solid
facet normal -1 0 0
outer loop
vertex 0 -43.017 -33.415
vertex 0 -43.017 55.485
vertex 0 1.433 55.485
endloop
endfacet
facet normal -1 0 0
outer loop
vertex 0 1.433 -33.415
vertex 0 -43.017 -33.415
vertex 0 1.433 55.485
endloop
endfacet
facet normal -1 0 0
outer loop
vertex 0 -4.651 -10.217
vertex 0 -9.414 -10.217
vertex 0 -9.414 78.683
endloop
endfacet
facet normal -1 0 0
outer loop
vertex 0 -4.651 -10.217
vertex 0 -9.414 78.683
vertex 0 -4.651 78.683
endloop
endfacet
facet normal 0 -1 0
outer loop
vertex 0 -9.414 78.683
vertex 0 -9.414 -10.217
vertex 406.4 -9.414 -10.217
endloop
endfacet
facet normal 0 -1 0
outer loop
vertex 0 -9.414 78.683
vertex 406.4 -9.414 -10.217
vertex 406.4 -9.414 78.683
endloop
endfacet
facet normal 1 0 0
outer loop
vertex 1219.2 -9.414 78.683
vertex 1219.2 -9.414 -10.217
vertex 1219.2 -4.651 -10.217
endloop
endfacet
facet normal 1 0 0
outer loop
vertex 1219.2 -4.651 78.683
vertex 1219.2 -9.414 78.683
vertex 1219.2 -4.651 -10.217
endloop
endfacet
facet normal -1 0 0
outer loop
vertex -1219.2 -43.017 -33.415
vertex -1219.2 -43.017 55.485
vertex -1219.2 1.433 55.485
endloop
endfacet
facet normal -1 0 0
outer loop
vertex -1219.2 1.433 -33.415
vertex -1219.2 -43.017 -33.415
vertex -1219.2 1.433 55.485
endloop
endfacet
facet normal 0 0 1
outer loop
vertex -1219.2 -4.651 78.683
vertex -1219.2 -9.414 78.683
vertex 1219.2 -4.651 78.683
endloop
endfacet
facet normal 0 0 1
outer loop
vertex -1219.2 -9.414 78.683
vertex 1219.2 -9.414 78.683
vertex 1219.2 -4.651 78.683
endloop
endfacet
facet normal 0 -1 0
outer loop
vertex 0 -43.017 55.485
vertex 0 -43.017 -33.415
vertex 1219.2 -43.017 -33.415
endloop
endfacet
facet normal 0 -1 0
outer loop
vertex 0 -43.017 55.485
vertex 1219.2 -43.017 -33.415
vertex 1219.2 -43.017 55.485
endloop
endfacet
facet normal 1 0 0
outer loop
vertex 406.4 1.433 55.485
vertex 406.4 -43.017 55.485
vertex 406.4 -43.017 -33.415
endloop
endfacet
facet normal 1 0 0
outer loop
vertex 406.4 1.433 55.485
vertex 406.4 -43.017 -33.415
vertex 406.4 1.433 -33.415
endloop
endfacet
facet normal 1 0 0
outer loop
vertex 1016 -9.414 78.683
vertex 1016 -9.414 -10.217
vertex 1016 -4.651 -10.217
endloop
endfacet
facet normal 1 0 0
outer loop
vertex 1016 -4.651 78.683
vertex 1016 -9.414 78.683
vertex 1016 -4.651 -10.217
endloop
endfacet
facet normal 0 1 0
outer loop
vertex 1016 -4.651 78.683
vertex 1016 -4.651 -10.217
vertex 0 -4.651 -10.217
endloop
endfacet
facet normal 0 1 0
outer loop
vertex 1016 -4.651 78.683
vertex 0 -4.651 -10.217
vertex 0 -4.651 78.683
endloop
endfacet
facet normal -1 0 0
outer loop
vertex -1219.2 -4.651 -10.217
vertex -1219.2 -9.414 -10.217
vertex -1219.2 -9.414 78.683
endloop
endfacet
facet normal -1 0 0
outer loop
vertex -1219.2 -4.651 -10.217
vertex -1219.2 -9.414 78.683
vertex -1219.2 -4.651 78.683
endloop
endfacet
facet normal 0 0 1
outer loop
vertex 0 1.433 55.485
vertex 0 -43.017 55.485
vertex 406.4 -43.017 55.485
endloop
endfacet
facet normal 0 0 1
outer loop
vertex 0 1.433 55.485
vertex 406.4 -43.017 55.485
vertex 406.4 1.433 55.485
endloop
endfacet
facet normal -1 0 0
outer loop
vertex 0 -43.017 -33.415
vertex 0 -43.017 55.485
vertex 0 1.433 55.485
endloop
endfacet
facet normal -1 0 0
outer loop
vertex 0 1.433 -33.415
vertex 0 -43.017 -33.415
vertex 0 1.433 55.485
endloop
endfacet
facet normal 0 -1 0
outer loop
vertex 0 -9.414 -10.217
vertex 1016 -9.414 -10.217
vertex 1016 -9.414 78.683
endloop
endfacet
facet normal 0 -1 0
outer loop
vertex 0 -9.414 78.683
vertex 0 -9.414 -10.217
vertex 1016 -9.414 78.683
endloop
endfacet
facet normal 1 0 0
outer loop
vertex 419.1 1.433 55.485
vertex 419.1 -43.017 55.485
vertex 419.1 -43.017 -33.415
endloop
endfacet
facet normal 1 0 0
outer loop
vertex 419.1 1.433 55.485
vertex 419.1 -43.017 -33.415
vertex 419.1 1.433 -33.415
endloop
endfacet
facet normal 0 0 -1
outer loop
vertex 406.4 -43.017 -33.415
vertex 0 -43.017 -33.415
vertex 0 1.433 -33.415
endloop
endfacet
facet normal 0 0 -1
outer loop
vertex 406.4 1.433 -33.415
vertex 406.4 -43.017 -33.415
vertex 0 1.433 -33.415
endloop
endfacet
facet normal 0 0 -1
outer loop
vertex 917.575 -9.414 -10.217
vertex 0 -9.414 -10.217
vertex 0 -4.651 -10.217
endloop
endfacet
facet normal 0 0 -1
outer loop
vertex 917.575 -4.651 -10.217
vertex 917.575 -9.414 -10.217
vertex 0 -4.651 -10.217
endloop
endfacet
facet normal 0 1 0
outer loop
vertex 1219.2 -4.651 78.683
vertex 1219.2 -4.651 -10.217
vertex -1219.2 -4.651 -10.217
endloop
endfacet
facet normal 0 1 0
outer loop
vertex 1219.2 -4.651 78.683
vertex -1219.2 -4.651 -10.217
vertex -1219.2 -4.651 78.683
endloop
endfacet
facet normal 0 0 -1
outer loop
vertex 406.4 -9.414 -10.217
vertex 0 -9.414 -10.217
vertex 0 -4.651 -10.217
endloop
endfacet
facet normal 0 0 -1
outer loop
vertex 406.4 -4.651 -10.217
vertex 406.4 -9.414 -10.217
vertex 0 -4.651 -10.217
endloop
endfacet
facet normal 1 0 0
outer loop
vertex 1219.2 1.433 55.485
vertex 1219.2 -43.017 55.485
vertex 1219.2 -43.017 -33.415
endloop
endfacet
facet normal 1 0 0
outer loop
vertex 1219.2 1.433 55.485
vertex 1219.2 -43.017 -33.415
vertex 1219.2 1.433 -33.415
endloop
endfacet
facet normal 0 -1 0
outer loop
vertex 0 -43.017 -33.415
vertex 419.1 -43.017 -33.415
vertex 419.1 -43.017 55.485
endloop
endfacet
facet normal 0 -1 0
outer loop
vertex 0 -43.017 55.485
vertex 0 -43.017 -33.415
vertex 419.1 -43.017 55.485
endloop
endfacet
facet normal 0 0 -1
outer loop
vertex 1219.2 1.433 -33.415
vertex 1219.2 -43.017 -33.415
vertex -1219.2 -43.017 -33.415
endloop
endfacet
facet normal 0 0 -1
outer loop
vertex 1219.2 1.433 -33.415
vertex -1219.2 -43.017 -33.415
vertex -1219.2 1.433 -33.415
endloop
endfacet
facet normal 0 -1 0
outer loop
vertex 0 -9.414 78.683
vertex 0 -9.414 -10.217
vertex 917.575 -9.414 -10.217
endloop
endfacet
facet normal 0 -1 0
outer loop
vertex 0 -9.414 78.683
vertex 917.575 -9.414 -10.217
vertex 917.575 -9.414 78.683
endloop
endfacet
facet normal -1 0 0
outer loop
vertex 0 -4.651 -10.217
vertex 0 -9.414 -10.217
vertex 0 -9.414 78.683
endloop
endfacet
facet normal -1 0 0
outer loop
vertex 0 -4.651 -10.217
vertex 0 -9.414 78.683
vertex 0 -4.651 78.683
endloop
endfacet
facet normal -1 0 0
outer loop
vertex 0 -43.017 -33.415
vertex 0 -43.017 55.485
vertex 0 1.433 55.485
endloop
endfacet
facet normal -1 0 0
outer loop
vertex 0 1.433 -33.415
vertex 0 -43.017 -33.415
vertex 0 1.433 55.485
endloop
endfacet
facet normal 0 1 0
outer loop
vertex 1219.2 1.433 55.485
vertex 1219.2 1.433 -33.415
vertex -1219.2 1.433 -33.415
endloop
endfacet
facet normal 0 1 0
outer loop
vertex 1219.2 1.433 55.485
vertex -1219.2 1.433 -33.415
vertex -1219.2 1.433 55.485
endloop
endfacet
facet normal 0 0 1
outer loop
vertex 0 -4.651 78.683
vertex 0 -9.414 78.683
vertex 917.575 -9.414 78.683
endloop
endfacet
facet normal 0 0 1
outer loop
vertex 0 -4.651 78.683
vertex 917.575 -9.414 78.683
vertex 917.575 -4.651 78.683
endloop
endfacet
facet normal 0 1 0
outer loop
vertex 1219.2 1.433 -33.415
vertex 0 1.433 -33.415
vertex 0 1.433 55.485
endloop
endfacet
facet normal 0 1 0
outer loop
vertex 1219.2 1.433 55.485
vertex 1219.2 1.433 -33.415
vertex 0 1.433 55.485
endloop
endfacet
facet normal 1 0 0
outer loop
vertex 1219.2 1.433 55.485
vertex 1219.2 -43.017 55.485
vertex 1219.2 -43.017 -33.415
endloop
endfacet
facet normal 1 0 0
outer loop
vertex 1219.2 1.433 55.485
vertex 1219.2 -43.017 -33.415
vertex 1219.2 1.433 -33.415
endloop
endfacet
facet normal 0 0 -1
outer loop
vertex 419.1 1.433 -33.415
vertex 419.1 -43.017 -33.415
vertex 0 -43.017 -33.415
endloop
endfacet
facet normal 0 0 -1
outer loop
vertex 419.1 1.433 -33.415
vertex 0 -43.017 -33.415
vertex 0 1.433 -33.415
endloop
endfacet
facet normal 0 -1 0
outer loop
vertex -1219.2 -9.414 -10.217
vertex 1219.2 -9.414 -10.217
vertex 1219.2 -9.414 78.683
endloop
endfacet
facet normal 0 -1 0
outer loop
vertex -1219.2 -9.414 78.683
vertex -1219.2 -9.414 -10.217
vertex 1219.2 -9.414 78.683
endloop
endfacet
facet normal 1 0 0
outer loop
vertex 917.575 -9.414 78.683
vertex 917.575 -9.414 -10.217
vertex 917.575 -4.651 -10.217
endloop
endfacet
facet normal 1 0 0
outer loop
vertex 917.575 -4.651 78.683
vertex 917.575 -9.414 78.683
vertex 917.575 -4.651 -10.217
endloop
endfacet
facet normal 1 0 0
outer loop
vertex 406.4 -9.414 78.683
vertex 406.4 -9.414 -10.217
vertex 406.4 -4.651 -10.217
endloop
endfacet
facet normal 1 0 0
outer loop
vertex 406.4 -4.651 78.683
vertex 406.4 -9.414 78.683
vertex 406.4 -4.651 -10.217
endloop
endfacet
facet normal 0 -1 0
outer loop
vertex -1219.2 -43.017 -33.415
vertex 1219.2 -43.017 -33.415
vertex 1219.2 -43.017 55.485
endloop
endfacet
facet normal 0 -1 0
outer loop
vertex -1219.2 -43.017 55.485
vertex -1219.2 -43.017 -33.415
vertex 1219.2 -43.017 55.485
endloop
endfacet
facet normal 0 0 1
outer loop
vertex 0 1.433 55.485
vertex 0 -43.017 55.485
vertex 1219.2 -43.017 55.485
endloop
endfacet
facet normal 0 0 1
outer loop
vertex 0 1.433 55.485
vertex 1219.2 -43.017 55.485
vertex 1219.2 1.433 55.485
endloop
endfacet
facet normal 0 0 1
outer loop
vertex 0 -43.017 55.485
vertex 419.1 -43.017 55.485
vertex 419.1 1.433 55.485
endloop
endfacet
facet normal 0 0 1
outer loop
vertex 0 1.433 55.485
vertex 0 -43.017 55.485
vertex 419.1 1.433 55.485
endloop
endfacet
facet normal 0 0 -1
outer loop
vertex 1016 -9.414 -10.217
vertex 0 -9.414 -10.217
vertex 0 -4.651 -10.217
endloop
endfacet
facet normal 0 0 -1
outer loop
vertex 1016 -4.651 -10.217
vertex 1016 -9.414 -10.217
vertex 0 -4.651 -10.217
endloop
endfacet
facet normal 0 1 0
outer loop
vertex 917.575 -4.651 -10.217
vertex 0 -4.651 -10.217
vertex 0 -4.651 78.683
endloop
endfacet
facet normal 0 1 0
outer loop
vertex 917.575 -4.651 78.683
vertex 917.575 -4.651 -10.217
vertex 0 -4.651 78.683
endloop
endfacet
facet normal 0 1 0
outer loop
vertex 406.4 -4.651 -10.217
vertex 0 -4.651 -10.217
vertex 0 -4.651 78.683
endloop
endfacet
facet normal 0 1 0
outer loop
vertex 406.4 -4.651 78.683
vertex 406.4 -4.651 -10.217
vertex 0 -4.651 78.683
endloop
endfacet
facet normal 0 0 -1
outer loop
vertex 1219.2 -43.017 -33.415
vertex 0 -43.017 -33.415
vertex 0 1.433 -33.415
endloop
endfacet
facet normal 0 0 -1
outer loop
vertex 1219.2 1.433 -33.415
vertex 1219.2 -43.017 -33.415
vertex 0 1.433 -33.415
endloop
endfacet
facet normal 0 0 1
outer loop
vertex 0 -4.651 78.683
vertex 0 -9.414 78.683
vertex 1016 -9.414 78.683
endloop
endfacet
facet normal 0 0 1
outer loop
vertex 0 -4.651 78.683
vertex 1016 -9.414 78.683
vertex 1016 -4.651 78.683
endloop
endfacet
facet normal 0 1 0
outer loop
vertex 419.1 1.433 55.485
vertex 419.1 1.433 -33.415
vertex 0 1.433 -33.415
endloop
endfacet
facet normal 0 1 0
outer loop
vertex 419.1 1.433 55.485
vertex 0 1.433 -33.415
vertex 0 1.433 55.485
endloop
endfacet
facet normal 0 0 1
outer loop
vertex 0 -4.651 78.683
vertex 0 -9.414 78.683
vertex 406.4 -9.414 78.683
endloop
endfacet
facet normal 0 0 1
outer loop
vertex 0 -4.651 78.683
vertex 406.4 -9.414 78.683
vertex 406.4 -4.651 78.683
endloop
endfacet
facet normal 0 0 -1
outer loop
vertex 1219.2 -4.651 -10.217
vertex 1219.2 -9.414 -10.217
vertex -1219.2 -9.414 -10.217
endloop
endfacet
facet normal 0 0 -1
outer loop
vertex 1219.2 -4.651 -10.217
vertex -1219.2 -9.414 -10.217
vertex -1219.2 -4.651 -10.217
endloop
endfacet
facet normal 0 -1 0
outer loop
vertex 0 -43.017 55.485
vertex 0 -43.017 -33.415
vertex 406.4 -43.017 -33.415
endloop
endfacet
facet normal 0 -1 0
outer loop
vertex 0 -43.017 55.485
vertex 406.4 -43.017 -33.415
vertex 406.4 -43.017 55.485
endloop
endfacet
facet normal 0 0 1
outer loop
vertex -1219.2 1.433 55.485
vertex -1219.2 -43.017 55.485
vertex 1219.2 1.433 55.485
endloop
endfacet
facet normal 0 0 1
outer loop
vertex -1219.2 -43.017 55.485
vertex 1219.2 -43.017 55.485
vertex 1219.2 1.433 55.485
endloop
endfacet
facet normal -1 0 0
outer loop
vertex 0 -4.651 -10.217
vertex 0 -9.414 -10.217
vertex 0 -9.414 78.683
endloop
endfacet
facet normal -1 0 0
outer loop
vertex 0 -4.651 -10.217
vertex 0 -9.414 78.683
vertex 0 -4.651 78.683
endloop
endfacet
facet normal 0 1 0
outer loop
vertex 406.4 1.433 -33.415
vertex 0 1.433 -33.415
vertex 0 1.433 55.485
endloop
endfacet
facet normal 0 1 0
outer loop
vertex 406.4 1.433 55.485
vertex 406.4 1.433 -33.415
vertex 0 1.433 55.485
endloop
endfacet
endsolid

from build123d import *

# Parameters (mm, degrees)
F0_W     = 4.7625
F0_H     = 88.9
F1_DEPTH = 1219.2
F2_W     = 44.45
F2_H     = 88.9
F3_DEPTH = 1219.2
F4_DEPTH = 1219.2
F5_DEPTH = 1016
F6_DEPTH = 406.4
F7_DEPTH = 917.575
F8_DEPTH = 419.1
F9_DEPTH = 406.4


with BuildPart() as f1:
    # F0 (on Right) → F1 (new body, symmetric)
    with BuildSketch(Plane.YZ):
        with Locations((-7.032388, 34.232576)):
            Rectangle(F0_W, F0_H)
    extrude(amount=F1_DEPTH, both=True)


with BuildPart() as f3:
    # F2 (on Right) → F3 (new body, symmetric)
    with BuildSketch(Plane.YZ):
        with Locations((-20.791516, 11.035349)):
            Rectangle(F2_W, F2_H)
    extrude(amount=F3_DEPTH, both=True)


with BuildPart() as f4:
    # F2 (on Right) → F4 (new body)
    with BuildSketch(Plane.YZ):
        with Locations((-20.791516, 11.035349)):
            Rectangle(F2_W, F2_H)
    extrude(amount=F4_DEPTH)


with BuildPart() as f5:
    # F0 (on Right) → F5 (new body)
    with BuildSketch(Plane.YZ):
        with Locations((-7.032388, 34.232576)):
            Rectangle(F0_W, F0_H)
    extrude(amount=F5_DEPTH)


with BuildPart() as f6:
    # F0 (on Right) → F6 (new body)
    with BuildSketch(Plane.YZ):
        with Locations((-7.032388, 34.232576)):
            Rectangle(F0_W, F0_H)
    extrude(amount=F6_DEPTH)


with BuildPart() as f7:
    # F0 (on Right) → F7 (new body)
    with BuildSketch(Plane.YZ):
        with Locations((-7.032388, 34.232576)):
            Rectangle(F0_W, F0_H)
    extrude(amount=F7_DEPTH)


with BuildPart() as f8:
    # F2 (on Right) → F8 (new body)
    with BuildSketch(Plane.YZ):
        with Locations((-20.791516, 11.035349)):
            Rectangle(F2_W, F2_H)
    extrude(amount=F8_DEPTH)


with BuildPart() as f9:
    # F2 (on Right) → F9 (new body)
    with BuildSketch(Plane.YZ):
        with Locations((-20.791516, 11.035349)):
            Rectangle(F2_W, F2_H)
    extrude(amount=F9_DEPTH)


solid = Compound([f1.part, f3.part, f4.part, f5.part, f6.part, f7.part, f8.part, f9.part])
